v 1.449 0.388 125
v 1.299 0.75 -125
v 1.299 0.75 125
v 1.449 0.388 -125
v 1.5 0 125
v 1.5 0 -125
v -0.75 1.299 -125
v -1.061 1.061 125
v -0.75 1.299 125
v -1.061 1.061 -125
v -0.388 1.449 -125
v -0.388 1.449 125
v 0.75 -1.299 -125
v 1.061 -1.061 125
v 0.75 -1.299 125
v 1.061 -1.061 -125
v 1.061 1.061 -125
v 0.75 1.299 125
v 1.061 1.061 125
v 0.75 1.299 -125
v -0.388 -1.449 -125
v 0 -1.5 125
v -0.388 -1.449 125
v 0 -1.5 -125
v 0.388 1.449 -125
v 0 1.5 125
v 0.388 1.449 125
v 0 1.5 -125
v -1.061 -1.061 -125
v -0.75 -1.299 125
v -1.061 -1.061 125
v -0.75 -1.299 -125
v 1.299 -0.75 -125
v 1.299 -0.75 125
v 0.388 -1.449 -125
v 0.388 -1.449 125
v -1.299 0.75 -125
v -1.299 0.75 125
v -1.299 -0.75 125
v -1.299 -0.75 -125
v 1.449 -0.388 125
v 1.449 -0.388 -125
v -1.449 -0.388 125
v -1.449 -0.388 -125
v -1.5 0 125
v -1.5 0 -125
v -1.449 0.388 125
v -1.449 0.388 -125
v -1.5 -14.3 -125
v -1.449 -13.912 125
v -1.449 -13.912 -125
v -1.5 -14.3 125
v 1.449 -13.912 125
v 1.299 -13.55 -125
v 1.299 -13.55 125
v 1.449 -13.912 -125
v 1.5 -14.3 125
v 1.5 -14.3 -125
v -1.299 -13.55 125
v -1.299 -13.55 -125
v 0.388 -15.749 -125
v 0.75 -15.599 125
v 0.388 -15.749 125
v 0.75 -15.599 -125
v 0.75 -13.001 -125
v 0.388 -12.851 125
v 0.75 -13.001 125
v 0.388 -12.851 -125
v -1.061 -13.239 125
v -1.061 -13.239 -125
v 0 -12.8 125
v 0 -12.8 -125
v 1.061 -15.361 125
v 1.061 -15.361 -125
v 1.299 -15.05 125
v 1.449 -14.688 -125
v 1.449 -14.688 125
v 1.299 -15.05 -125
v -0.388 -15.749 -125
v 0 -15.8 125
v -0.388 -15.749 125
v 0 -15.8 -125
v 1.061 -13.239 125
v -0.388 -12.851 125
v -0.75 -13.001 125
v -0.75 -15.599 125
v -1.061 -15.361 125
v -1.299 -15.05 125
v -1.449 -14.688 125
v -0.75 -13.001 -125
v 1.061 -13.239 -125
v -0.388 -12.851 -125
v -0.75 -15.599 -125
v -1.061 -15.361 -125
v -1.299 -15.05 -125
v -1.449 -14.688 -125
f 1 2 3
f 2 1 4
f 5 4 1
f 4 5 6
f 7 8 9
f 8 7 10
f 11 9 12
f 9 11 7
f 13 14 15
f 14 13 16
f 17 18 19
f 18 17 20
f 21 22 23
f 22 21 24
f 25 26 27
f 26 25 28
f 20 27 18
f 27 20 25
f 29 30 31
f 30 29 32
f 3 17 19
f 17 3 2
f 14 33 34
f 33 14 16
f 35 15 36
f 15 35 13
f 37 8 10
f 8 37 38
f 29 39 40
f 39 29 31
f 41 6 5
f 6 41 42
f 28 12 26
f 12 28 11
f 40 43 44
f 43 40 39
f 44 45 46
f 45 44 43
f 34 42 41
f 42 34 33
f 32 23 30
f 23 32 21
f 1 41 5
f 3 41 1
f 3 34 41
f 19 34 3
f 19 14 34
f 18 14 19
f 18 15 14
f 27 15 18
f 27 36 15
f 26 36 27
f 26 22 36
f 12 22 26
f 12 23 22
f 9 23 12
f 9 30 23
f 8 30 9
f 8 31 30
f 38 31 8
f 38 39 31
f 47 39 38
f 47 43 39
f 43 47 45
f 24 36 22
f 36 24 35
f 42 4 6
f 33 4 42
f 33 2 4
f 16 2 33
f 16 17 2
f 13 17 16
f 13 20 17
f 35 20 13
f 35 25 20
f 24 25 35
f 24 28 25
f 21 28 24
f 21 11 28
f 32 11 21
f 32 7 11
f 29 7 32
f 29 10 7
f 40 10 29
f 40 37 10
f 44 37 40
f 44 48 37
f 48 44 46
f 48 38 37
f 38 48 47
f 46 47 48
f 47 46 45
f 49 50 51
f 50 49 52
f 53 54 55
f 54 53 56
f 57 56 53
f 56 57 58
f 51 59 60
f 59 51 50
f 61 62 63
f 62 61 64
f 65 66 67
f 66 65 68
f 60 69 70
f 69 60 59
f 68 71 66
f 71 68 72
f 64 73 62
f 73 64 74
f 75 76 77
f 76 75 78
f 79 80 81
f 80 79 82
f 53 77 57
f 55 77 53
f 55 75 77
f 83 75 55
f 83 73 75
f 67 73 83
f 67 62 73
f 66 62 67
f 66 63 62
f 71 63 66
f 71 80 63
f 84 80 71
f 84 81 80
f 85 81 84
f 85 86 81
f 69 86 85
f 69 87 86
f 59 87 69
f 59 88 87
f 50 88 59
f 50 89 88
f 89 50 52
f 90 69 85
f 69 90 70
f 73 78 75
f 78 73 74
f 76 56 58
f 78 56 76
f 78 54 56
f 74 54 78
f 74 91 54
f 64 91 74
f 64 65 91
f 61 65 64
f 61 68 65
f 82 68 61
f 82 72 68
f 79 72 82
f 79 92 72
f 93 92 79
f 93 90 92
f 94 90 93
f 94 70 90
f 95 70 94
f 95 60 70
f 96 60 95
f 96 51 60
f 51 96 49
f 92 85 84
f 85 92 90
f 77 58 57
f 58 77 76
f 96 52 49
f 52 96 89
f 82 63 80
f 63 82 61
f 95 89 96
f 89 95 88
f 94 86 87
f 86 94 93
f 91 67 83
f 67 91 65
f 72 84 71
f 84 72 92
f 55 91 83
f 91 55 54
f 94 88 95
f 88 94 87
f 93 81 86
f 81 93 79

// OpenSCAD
// file: definitions.scad
// ============================================================================
// NOTES:
// Definitions file. To be imported via the include <> statement.
// You can render it for test, but do not export to STL.
//
// ============================================================================

//
// GENERAL
//

$fn = 96;
$fn = 8;
$fn = 24;
//$fn = 12;

PLAY = 0.4;
TOLERANCE = 0.17;
ATOM = 0.01;
WALL_THICKNESS = 1;

//
// SERVO (new)
//

SERVO_THICKNESS = 11.5;
SERVO_AXIS_RADIUS = 3;
SERVO_LENGTH = 33.3;

//
// GEARS (new)
//

GEARS_DISTANCE = 14.3;
//echo("GEARS_DISTANCE", GEARS_DISTANCE);

GEARS_THICKNESS = 5;
WHEEL_AXIS_TIGHTEN = TOLERANCE*0.75;
WHEEL_HOLE_DIAMETER = SERVO_AXIS_RADIUS*2 - WHEEL_AXIS_TIGHTEN;

//PINION_RADIUS = 5.6;
//WHEEL_RADIUS = 10.6;
WHEEL_PLATE_HEIGHT = 1;

//    Erlaubte Module nach DIN 780:
//    0.05 0.06 0.08 0.10 0.12 0.16
//    0.20 0.25 0.3  0.4  0.5  0.6
//    0.7  0.8  0.9  1    1.25 1.5
//    2    2.5  3    4    5    6
//    8    10   12   16   20   25
//    32   40   50   60
GEARS_MODULE = 0.65;

ROD_DIAMETER = 3;



// Plate
PLATE_DIAMETER = 50;
PLATE_HEIGHT = 20.5;
PLATES_OVERLAP = 12;

PLATE_HEIGHT_SHORT = 18;


PLATE2_WHEEL_HEIGHT = 2.5;
PLATE2_HEIGHT = PLATE2_WHEEL_HEIGHT + GEARS_THICKNESS;
//echo("PLATE2_HEIGHT", PLATE2_HEIGHT);

PLATE2_GROVE_HEIGHT = 2;
PLATE2_GROVE_THICKNESS = 5;
PLATE2_LEVER_HEIGHT = 2;

PLATE2_BAR_WIDTH = 5;
PLATE2_RADIUS_RECESSION = 1.5;

PLATE2_RADIUS = PLATE_DIAMETER/2 - PLATE2_RADIUS_RECESSION;

BASE_PLATE_CAVITY_DIAMETER = 20;
BASE_PLATE_CROWN_HEIGHT = 9;

// Side screws
SCREW_PLATE_HEIGHT = 1;
SCREW2_DIAMETER = 2.9;
SCREW2_HEAD_DIAMETER = 5.5;
SCREW2_HEAD_THICKNESS = 2;
SCREW2_HEIGHT = 12; // overall

SERVO_SCREW1_H_DISPLACEMENT = 20.5;
SERVO_SCREW2_H_DISPLACEMENT = -9;
SERVO_SCREW_V_DISPLACEMENT = -10.75;
SERVO_SCREW_HEAD_EXTENT = 20;

SERVO_SCREW_THREAD_DIAMETER = 2.5;


HOLDER_ARM_HEIGHT = 13;
HOLDER_ARM_RADIUS_SHORTAGE = 15;
HOLDER_ARM_RADIUS = 4;
HOLDER_ARM_THICKNESS = 6;
HOLDER_THICKNESS = 3;
HOLDER_ANGLE = 35; //20
HOLDER_MODULES_SPACING = 10;


block_cylinder = PLATE_HEIGHT + PLATE2_HEIGHT;
BLOCKS_JOIN = 0.3;
BLOCK1_HEIGHT = block_cylinder*2  + PLAY*2 - PLATE2_HEIGHT;
BLOCK1_HEIGHT_STACKABLE = BLOCK1_HEIGHT + BLOCKS_JOIN;

BLOCK2_HEIGHT = PLATE2_HEIGHT + PLAY*2;
BLOCK2_HEIGHT_STACKABLE = BLOCK2_HEIGHT + BLOCKS_JOIN;
//echo("BLOCK2_HEIGHT (w/o join)", BLOCK2_HEIGHT);

BLOCK3_HEIGHT = block_cylinder*2  + PLAY*2 - PLATE2_HEIGHT;
BLOCK3_HEIGHT_STACKABLE = BLOCK3_HEIGHT + BLOCKS_JOIN;

DIGIT_SEGMENT_WIDTH = 3.5;
DIGIT_SEGMENT_WIDTH = BLOCK2_HEIGHT - PLAY;

// Snapping
SNAP_HOLE_DIAMETER = 4;

CUBE_CROWN_HEIGHT = 3.5;
CUBE_CROWN_SHORT_HEIGHT = 1;
CUBE_LEVER_THICKNESS = 4;
CUBE_SNAP_BALLS_RADIUS = 0.6/2; // <== ADJUST
CUBE_SNAP_BALLS_RADIUS = 0.6/3; // <== ADJUST
CUBE_SNAP_BALLS_RADIUS = 0.6/2.5; // <== ADJUST
CUBE_SNAP_BALLS_K = 3;

PLATE2_Z = BLOCK1_HEIGHT_STACKABLE
         + CUBE_CROWN_HEIGHT
         + BLOCK2_HEIGHT/2
         - PLATE2_WHEEL_HEIGHT/2;

//////////////////////////////////////////////////////////////////////////

//
// SPECIFIC
//

//// Center screw
//SCREW_SHAFT_DIAMETER = 2;
//SCREW_THREAD_DIAMETER = 2.5;
//SCREW_HOLE_LENGTH = 5;



// PLATE 2
PINION_NECK_RADIUS = 6.5;
PINION_SCREW_HEAD_RADIUS = 3 + PLAY;

PINION_THICKNESS = 5.3;
PINION_HEIGHT = PINION_THICKNESS;

BLOCKS_WIDTH = 70;

PLATE2_BOX_INNER_HOLE_DIAMETER = 62;

WHEEL_THICKNESS = 3.5 -0.2;

SERVO_X_ADJUSTMENT = 0.5;
SERVO_X_POSITION = WHEEL_THICKNESS - SCREW_PLATE_HEIGHT
                   + SERVO_X_ADJUSTMENT;
//echo("Servo x pos: ", SERVO_X_POSITION);

HOLDER_RADIUS = 29.5;
HOLDER_SPINE_THICKNESS = 2.5 +1;

ZIP_TIE_SLIT_WIDTH = 3;
ZIP_TIE_SLIT_THICKNESS = 2;
ZIP_TIE_BUMP_RADIUS = 1;

//echo("Total height: ", PLATE_HEIGHT+PLATE2_HEIGHT+PLAY+TOLERANCE);


//
// DIGIT SEGMENTS
// 

SEGMENTS_TOP = ["a", "b", "c", "c", "b", "d", "d", "c", "a", "a"];
SEGMENTS_MID = ["j", "i", "k", "k", "k", "k", "k", "i", "k", "k"];
SEGMENTS_LOW = ["e", "f", "g", "h", "f", "h", "e", "f", "e", "h"];

//
// HELPERS
//

module spoke(radius, width, height) {
    translate([0, 0, height/2])
    intersection() {
        cube([radius*3, width, height], true);

        translate([0, 0, -height/2])
        scale([1, 1, height])
        cylinder(r=radius, true);
    }
}

module barrel(outer_radius, inner_radius, height) {
    scale([1, 1, height])
    difference() {
        cylinder(r=outer_radius);
        translate([0, 0, -0.5]) scale([1, 1, 2])
        cylinder(r=inner_radius);
    }
}

module box_sides(outer_side, thickness, height) {
    scale([1, 1, height/outer_side])
    translate([0, 0, outer_side/2])
    difference() {
        cube(outer_side, true);
        scale([1, 1, 2])
        cube(outer_side - thickness*2, true);
    }
}

module alignment_columns(column_extra=0, height=1) {
    r = PLATE_DIAMETER/2 - PLATE_SCREWS_BORDER_DISTANCE;
    n = 4;
    offset_angle = 45;
    scale([1, 1, height])
    for(a=[0:n-1])
        rotate([0, 0, a*360/n + offset_angle])
        translate([0, r, 0])
        cylinder(r=SNAP_HOLE_DIAMETER/2 + column_extra, true);        
}

function servo_cover_height() =
           PLATE_HEIGHT
           - (WHEEL_EXTERNAL_DIAMETER/2 - PINION_THICKNESS
              + SERVO_THICKNESS/2)
           -TOLERANCE;

module screw(head_extent=0, is_clearance_hole=false) {   
    // thread
    translate([0, 0, -SCREW2_HEIGHT + SCREW2_HEAD_THICKNESS])
    cylinder(h=SCREW2_HEIGHT,
             r=SCREW2_DIAMETER/2 - TOLERANCE
               + (is_clearance_hole ? TOLERANCE*2 : 0));
    // head
    cylinder(h=SCREW2_HEAD_THICKNESS+head_extent, 
             r=SCREW2_HEAD_DIAMETER/2
               +(is_clearance_hole ? PLAY : 0));
}

module flip(height, additional_angle=0) {
        translate([0, 0, height])
        rotate([180, 0, 90-additional_angle])
        children();
}
// main file
include <definitions.scad>


module rod1() {
	cylinder(r=ROD_DIAMETER/2, h=250, center=true);
}

module rod2() {
	translate([0, -GEARS_DISTANCE, 0])
	cylinder(r=ROD_DIAMETER/2, h=250, center=true);
}

module rods() {
	rod1();
	rod2();
}

rods();
